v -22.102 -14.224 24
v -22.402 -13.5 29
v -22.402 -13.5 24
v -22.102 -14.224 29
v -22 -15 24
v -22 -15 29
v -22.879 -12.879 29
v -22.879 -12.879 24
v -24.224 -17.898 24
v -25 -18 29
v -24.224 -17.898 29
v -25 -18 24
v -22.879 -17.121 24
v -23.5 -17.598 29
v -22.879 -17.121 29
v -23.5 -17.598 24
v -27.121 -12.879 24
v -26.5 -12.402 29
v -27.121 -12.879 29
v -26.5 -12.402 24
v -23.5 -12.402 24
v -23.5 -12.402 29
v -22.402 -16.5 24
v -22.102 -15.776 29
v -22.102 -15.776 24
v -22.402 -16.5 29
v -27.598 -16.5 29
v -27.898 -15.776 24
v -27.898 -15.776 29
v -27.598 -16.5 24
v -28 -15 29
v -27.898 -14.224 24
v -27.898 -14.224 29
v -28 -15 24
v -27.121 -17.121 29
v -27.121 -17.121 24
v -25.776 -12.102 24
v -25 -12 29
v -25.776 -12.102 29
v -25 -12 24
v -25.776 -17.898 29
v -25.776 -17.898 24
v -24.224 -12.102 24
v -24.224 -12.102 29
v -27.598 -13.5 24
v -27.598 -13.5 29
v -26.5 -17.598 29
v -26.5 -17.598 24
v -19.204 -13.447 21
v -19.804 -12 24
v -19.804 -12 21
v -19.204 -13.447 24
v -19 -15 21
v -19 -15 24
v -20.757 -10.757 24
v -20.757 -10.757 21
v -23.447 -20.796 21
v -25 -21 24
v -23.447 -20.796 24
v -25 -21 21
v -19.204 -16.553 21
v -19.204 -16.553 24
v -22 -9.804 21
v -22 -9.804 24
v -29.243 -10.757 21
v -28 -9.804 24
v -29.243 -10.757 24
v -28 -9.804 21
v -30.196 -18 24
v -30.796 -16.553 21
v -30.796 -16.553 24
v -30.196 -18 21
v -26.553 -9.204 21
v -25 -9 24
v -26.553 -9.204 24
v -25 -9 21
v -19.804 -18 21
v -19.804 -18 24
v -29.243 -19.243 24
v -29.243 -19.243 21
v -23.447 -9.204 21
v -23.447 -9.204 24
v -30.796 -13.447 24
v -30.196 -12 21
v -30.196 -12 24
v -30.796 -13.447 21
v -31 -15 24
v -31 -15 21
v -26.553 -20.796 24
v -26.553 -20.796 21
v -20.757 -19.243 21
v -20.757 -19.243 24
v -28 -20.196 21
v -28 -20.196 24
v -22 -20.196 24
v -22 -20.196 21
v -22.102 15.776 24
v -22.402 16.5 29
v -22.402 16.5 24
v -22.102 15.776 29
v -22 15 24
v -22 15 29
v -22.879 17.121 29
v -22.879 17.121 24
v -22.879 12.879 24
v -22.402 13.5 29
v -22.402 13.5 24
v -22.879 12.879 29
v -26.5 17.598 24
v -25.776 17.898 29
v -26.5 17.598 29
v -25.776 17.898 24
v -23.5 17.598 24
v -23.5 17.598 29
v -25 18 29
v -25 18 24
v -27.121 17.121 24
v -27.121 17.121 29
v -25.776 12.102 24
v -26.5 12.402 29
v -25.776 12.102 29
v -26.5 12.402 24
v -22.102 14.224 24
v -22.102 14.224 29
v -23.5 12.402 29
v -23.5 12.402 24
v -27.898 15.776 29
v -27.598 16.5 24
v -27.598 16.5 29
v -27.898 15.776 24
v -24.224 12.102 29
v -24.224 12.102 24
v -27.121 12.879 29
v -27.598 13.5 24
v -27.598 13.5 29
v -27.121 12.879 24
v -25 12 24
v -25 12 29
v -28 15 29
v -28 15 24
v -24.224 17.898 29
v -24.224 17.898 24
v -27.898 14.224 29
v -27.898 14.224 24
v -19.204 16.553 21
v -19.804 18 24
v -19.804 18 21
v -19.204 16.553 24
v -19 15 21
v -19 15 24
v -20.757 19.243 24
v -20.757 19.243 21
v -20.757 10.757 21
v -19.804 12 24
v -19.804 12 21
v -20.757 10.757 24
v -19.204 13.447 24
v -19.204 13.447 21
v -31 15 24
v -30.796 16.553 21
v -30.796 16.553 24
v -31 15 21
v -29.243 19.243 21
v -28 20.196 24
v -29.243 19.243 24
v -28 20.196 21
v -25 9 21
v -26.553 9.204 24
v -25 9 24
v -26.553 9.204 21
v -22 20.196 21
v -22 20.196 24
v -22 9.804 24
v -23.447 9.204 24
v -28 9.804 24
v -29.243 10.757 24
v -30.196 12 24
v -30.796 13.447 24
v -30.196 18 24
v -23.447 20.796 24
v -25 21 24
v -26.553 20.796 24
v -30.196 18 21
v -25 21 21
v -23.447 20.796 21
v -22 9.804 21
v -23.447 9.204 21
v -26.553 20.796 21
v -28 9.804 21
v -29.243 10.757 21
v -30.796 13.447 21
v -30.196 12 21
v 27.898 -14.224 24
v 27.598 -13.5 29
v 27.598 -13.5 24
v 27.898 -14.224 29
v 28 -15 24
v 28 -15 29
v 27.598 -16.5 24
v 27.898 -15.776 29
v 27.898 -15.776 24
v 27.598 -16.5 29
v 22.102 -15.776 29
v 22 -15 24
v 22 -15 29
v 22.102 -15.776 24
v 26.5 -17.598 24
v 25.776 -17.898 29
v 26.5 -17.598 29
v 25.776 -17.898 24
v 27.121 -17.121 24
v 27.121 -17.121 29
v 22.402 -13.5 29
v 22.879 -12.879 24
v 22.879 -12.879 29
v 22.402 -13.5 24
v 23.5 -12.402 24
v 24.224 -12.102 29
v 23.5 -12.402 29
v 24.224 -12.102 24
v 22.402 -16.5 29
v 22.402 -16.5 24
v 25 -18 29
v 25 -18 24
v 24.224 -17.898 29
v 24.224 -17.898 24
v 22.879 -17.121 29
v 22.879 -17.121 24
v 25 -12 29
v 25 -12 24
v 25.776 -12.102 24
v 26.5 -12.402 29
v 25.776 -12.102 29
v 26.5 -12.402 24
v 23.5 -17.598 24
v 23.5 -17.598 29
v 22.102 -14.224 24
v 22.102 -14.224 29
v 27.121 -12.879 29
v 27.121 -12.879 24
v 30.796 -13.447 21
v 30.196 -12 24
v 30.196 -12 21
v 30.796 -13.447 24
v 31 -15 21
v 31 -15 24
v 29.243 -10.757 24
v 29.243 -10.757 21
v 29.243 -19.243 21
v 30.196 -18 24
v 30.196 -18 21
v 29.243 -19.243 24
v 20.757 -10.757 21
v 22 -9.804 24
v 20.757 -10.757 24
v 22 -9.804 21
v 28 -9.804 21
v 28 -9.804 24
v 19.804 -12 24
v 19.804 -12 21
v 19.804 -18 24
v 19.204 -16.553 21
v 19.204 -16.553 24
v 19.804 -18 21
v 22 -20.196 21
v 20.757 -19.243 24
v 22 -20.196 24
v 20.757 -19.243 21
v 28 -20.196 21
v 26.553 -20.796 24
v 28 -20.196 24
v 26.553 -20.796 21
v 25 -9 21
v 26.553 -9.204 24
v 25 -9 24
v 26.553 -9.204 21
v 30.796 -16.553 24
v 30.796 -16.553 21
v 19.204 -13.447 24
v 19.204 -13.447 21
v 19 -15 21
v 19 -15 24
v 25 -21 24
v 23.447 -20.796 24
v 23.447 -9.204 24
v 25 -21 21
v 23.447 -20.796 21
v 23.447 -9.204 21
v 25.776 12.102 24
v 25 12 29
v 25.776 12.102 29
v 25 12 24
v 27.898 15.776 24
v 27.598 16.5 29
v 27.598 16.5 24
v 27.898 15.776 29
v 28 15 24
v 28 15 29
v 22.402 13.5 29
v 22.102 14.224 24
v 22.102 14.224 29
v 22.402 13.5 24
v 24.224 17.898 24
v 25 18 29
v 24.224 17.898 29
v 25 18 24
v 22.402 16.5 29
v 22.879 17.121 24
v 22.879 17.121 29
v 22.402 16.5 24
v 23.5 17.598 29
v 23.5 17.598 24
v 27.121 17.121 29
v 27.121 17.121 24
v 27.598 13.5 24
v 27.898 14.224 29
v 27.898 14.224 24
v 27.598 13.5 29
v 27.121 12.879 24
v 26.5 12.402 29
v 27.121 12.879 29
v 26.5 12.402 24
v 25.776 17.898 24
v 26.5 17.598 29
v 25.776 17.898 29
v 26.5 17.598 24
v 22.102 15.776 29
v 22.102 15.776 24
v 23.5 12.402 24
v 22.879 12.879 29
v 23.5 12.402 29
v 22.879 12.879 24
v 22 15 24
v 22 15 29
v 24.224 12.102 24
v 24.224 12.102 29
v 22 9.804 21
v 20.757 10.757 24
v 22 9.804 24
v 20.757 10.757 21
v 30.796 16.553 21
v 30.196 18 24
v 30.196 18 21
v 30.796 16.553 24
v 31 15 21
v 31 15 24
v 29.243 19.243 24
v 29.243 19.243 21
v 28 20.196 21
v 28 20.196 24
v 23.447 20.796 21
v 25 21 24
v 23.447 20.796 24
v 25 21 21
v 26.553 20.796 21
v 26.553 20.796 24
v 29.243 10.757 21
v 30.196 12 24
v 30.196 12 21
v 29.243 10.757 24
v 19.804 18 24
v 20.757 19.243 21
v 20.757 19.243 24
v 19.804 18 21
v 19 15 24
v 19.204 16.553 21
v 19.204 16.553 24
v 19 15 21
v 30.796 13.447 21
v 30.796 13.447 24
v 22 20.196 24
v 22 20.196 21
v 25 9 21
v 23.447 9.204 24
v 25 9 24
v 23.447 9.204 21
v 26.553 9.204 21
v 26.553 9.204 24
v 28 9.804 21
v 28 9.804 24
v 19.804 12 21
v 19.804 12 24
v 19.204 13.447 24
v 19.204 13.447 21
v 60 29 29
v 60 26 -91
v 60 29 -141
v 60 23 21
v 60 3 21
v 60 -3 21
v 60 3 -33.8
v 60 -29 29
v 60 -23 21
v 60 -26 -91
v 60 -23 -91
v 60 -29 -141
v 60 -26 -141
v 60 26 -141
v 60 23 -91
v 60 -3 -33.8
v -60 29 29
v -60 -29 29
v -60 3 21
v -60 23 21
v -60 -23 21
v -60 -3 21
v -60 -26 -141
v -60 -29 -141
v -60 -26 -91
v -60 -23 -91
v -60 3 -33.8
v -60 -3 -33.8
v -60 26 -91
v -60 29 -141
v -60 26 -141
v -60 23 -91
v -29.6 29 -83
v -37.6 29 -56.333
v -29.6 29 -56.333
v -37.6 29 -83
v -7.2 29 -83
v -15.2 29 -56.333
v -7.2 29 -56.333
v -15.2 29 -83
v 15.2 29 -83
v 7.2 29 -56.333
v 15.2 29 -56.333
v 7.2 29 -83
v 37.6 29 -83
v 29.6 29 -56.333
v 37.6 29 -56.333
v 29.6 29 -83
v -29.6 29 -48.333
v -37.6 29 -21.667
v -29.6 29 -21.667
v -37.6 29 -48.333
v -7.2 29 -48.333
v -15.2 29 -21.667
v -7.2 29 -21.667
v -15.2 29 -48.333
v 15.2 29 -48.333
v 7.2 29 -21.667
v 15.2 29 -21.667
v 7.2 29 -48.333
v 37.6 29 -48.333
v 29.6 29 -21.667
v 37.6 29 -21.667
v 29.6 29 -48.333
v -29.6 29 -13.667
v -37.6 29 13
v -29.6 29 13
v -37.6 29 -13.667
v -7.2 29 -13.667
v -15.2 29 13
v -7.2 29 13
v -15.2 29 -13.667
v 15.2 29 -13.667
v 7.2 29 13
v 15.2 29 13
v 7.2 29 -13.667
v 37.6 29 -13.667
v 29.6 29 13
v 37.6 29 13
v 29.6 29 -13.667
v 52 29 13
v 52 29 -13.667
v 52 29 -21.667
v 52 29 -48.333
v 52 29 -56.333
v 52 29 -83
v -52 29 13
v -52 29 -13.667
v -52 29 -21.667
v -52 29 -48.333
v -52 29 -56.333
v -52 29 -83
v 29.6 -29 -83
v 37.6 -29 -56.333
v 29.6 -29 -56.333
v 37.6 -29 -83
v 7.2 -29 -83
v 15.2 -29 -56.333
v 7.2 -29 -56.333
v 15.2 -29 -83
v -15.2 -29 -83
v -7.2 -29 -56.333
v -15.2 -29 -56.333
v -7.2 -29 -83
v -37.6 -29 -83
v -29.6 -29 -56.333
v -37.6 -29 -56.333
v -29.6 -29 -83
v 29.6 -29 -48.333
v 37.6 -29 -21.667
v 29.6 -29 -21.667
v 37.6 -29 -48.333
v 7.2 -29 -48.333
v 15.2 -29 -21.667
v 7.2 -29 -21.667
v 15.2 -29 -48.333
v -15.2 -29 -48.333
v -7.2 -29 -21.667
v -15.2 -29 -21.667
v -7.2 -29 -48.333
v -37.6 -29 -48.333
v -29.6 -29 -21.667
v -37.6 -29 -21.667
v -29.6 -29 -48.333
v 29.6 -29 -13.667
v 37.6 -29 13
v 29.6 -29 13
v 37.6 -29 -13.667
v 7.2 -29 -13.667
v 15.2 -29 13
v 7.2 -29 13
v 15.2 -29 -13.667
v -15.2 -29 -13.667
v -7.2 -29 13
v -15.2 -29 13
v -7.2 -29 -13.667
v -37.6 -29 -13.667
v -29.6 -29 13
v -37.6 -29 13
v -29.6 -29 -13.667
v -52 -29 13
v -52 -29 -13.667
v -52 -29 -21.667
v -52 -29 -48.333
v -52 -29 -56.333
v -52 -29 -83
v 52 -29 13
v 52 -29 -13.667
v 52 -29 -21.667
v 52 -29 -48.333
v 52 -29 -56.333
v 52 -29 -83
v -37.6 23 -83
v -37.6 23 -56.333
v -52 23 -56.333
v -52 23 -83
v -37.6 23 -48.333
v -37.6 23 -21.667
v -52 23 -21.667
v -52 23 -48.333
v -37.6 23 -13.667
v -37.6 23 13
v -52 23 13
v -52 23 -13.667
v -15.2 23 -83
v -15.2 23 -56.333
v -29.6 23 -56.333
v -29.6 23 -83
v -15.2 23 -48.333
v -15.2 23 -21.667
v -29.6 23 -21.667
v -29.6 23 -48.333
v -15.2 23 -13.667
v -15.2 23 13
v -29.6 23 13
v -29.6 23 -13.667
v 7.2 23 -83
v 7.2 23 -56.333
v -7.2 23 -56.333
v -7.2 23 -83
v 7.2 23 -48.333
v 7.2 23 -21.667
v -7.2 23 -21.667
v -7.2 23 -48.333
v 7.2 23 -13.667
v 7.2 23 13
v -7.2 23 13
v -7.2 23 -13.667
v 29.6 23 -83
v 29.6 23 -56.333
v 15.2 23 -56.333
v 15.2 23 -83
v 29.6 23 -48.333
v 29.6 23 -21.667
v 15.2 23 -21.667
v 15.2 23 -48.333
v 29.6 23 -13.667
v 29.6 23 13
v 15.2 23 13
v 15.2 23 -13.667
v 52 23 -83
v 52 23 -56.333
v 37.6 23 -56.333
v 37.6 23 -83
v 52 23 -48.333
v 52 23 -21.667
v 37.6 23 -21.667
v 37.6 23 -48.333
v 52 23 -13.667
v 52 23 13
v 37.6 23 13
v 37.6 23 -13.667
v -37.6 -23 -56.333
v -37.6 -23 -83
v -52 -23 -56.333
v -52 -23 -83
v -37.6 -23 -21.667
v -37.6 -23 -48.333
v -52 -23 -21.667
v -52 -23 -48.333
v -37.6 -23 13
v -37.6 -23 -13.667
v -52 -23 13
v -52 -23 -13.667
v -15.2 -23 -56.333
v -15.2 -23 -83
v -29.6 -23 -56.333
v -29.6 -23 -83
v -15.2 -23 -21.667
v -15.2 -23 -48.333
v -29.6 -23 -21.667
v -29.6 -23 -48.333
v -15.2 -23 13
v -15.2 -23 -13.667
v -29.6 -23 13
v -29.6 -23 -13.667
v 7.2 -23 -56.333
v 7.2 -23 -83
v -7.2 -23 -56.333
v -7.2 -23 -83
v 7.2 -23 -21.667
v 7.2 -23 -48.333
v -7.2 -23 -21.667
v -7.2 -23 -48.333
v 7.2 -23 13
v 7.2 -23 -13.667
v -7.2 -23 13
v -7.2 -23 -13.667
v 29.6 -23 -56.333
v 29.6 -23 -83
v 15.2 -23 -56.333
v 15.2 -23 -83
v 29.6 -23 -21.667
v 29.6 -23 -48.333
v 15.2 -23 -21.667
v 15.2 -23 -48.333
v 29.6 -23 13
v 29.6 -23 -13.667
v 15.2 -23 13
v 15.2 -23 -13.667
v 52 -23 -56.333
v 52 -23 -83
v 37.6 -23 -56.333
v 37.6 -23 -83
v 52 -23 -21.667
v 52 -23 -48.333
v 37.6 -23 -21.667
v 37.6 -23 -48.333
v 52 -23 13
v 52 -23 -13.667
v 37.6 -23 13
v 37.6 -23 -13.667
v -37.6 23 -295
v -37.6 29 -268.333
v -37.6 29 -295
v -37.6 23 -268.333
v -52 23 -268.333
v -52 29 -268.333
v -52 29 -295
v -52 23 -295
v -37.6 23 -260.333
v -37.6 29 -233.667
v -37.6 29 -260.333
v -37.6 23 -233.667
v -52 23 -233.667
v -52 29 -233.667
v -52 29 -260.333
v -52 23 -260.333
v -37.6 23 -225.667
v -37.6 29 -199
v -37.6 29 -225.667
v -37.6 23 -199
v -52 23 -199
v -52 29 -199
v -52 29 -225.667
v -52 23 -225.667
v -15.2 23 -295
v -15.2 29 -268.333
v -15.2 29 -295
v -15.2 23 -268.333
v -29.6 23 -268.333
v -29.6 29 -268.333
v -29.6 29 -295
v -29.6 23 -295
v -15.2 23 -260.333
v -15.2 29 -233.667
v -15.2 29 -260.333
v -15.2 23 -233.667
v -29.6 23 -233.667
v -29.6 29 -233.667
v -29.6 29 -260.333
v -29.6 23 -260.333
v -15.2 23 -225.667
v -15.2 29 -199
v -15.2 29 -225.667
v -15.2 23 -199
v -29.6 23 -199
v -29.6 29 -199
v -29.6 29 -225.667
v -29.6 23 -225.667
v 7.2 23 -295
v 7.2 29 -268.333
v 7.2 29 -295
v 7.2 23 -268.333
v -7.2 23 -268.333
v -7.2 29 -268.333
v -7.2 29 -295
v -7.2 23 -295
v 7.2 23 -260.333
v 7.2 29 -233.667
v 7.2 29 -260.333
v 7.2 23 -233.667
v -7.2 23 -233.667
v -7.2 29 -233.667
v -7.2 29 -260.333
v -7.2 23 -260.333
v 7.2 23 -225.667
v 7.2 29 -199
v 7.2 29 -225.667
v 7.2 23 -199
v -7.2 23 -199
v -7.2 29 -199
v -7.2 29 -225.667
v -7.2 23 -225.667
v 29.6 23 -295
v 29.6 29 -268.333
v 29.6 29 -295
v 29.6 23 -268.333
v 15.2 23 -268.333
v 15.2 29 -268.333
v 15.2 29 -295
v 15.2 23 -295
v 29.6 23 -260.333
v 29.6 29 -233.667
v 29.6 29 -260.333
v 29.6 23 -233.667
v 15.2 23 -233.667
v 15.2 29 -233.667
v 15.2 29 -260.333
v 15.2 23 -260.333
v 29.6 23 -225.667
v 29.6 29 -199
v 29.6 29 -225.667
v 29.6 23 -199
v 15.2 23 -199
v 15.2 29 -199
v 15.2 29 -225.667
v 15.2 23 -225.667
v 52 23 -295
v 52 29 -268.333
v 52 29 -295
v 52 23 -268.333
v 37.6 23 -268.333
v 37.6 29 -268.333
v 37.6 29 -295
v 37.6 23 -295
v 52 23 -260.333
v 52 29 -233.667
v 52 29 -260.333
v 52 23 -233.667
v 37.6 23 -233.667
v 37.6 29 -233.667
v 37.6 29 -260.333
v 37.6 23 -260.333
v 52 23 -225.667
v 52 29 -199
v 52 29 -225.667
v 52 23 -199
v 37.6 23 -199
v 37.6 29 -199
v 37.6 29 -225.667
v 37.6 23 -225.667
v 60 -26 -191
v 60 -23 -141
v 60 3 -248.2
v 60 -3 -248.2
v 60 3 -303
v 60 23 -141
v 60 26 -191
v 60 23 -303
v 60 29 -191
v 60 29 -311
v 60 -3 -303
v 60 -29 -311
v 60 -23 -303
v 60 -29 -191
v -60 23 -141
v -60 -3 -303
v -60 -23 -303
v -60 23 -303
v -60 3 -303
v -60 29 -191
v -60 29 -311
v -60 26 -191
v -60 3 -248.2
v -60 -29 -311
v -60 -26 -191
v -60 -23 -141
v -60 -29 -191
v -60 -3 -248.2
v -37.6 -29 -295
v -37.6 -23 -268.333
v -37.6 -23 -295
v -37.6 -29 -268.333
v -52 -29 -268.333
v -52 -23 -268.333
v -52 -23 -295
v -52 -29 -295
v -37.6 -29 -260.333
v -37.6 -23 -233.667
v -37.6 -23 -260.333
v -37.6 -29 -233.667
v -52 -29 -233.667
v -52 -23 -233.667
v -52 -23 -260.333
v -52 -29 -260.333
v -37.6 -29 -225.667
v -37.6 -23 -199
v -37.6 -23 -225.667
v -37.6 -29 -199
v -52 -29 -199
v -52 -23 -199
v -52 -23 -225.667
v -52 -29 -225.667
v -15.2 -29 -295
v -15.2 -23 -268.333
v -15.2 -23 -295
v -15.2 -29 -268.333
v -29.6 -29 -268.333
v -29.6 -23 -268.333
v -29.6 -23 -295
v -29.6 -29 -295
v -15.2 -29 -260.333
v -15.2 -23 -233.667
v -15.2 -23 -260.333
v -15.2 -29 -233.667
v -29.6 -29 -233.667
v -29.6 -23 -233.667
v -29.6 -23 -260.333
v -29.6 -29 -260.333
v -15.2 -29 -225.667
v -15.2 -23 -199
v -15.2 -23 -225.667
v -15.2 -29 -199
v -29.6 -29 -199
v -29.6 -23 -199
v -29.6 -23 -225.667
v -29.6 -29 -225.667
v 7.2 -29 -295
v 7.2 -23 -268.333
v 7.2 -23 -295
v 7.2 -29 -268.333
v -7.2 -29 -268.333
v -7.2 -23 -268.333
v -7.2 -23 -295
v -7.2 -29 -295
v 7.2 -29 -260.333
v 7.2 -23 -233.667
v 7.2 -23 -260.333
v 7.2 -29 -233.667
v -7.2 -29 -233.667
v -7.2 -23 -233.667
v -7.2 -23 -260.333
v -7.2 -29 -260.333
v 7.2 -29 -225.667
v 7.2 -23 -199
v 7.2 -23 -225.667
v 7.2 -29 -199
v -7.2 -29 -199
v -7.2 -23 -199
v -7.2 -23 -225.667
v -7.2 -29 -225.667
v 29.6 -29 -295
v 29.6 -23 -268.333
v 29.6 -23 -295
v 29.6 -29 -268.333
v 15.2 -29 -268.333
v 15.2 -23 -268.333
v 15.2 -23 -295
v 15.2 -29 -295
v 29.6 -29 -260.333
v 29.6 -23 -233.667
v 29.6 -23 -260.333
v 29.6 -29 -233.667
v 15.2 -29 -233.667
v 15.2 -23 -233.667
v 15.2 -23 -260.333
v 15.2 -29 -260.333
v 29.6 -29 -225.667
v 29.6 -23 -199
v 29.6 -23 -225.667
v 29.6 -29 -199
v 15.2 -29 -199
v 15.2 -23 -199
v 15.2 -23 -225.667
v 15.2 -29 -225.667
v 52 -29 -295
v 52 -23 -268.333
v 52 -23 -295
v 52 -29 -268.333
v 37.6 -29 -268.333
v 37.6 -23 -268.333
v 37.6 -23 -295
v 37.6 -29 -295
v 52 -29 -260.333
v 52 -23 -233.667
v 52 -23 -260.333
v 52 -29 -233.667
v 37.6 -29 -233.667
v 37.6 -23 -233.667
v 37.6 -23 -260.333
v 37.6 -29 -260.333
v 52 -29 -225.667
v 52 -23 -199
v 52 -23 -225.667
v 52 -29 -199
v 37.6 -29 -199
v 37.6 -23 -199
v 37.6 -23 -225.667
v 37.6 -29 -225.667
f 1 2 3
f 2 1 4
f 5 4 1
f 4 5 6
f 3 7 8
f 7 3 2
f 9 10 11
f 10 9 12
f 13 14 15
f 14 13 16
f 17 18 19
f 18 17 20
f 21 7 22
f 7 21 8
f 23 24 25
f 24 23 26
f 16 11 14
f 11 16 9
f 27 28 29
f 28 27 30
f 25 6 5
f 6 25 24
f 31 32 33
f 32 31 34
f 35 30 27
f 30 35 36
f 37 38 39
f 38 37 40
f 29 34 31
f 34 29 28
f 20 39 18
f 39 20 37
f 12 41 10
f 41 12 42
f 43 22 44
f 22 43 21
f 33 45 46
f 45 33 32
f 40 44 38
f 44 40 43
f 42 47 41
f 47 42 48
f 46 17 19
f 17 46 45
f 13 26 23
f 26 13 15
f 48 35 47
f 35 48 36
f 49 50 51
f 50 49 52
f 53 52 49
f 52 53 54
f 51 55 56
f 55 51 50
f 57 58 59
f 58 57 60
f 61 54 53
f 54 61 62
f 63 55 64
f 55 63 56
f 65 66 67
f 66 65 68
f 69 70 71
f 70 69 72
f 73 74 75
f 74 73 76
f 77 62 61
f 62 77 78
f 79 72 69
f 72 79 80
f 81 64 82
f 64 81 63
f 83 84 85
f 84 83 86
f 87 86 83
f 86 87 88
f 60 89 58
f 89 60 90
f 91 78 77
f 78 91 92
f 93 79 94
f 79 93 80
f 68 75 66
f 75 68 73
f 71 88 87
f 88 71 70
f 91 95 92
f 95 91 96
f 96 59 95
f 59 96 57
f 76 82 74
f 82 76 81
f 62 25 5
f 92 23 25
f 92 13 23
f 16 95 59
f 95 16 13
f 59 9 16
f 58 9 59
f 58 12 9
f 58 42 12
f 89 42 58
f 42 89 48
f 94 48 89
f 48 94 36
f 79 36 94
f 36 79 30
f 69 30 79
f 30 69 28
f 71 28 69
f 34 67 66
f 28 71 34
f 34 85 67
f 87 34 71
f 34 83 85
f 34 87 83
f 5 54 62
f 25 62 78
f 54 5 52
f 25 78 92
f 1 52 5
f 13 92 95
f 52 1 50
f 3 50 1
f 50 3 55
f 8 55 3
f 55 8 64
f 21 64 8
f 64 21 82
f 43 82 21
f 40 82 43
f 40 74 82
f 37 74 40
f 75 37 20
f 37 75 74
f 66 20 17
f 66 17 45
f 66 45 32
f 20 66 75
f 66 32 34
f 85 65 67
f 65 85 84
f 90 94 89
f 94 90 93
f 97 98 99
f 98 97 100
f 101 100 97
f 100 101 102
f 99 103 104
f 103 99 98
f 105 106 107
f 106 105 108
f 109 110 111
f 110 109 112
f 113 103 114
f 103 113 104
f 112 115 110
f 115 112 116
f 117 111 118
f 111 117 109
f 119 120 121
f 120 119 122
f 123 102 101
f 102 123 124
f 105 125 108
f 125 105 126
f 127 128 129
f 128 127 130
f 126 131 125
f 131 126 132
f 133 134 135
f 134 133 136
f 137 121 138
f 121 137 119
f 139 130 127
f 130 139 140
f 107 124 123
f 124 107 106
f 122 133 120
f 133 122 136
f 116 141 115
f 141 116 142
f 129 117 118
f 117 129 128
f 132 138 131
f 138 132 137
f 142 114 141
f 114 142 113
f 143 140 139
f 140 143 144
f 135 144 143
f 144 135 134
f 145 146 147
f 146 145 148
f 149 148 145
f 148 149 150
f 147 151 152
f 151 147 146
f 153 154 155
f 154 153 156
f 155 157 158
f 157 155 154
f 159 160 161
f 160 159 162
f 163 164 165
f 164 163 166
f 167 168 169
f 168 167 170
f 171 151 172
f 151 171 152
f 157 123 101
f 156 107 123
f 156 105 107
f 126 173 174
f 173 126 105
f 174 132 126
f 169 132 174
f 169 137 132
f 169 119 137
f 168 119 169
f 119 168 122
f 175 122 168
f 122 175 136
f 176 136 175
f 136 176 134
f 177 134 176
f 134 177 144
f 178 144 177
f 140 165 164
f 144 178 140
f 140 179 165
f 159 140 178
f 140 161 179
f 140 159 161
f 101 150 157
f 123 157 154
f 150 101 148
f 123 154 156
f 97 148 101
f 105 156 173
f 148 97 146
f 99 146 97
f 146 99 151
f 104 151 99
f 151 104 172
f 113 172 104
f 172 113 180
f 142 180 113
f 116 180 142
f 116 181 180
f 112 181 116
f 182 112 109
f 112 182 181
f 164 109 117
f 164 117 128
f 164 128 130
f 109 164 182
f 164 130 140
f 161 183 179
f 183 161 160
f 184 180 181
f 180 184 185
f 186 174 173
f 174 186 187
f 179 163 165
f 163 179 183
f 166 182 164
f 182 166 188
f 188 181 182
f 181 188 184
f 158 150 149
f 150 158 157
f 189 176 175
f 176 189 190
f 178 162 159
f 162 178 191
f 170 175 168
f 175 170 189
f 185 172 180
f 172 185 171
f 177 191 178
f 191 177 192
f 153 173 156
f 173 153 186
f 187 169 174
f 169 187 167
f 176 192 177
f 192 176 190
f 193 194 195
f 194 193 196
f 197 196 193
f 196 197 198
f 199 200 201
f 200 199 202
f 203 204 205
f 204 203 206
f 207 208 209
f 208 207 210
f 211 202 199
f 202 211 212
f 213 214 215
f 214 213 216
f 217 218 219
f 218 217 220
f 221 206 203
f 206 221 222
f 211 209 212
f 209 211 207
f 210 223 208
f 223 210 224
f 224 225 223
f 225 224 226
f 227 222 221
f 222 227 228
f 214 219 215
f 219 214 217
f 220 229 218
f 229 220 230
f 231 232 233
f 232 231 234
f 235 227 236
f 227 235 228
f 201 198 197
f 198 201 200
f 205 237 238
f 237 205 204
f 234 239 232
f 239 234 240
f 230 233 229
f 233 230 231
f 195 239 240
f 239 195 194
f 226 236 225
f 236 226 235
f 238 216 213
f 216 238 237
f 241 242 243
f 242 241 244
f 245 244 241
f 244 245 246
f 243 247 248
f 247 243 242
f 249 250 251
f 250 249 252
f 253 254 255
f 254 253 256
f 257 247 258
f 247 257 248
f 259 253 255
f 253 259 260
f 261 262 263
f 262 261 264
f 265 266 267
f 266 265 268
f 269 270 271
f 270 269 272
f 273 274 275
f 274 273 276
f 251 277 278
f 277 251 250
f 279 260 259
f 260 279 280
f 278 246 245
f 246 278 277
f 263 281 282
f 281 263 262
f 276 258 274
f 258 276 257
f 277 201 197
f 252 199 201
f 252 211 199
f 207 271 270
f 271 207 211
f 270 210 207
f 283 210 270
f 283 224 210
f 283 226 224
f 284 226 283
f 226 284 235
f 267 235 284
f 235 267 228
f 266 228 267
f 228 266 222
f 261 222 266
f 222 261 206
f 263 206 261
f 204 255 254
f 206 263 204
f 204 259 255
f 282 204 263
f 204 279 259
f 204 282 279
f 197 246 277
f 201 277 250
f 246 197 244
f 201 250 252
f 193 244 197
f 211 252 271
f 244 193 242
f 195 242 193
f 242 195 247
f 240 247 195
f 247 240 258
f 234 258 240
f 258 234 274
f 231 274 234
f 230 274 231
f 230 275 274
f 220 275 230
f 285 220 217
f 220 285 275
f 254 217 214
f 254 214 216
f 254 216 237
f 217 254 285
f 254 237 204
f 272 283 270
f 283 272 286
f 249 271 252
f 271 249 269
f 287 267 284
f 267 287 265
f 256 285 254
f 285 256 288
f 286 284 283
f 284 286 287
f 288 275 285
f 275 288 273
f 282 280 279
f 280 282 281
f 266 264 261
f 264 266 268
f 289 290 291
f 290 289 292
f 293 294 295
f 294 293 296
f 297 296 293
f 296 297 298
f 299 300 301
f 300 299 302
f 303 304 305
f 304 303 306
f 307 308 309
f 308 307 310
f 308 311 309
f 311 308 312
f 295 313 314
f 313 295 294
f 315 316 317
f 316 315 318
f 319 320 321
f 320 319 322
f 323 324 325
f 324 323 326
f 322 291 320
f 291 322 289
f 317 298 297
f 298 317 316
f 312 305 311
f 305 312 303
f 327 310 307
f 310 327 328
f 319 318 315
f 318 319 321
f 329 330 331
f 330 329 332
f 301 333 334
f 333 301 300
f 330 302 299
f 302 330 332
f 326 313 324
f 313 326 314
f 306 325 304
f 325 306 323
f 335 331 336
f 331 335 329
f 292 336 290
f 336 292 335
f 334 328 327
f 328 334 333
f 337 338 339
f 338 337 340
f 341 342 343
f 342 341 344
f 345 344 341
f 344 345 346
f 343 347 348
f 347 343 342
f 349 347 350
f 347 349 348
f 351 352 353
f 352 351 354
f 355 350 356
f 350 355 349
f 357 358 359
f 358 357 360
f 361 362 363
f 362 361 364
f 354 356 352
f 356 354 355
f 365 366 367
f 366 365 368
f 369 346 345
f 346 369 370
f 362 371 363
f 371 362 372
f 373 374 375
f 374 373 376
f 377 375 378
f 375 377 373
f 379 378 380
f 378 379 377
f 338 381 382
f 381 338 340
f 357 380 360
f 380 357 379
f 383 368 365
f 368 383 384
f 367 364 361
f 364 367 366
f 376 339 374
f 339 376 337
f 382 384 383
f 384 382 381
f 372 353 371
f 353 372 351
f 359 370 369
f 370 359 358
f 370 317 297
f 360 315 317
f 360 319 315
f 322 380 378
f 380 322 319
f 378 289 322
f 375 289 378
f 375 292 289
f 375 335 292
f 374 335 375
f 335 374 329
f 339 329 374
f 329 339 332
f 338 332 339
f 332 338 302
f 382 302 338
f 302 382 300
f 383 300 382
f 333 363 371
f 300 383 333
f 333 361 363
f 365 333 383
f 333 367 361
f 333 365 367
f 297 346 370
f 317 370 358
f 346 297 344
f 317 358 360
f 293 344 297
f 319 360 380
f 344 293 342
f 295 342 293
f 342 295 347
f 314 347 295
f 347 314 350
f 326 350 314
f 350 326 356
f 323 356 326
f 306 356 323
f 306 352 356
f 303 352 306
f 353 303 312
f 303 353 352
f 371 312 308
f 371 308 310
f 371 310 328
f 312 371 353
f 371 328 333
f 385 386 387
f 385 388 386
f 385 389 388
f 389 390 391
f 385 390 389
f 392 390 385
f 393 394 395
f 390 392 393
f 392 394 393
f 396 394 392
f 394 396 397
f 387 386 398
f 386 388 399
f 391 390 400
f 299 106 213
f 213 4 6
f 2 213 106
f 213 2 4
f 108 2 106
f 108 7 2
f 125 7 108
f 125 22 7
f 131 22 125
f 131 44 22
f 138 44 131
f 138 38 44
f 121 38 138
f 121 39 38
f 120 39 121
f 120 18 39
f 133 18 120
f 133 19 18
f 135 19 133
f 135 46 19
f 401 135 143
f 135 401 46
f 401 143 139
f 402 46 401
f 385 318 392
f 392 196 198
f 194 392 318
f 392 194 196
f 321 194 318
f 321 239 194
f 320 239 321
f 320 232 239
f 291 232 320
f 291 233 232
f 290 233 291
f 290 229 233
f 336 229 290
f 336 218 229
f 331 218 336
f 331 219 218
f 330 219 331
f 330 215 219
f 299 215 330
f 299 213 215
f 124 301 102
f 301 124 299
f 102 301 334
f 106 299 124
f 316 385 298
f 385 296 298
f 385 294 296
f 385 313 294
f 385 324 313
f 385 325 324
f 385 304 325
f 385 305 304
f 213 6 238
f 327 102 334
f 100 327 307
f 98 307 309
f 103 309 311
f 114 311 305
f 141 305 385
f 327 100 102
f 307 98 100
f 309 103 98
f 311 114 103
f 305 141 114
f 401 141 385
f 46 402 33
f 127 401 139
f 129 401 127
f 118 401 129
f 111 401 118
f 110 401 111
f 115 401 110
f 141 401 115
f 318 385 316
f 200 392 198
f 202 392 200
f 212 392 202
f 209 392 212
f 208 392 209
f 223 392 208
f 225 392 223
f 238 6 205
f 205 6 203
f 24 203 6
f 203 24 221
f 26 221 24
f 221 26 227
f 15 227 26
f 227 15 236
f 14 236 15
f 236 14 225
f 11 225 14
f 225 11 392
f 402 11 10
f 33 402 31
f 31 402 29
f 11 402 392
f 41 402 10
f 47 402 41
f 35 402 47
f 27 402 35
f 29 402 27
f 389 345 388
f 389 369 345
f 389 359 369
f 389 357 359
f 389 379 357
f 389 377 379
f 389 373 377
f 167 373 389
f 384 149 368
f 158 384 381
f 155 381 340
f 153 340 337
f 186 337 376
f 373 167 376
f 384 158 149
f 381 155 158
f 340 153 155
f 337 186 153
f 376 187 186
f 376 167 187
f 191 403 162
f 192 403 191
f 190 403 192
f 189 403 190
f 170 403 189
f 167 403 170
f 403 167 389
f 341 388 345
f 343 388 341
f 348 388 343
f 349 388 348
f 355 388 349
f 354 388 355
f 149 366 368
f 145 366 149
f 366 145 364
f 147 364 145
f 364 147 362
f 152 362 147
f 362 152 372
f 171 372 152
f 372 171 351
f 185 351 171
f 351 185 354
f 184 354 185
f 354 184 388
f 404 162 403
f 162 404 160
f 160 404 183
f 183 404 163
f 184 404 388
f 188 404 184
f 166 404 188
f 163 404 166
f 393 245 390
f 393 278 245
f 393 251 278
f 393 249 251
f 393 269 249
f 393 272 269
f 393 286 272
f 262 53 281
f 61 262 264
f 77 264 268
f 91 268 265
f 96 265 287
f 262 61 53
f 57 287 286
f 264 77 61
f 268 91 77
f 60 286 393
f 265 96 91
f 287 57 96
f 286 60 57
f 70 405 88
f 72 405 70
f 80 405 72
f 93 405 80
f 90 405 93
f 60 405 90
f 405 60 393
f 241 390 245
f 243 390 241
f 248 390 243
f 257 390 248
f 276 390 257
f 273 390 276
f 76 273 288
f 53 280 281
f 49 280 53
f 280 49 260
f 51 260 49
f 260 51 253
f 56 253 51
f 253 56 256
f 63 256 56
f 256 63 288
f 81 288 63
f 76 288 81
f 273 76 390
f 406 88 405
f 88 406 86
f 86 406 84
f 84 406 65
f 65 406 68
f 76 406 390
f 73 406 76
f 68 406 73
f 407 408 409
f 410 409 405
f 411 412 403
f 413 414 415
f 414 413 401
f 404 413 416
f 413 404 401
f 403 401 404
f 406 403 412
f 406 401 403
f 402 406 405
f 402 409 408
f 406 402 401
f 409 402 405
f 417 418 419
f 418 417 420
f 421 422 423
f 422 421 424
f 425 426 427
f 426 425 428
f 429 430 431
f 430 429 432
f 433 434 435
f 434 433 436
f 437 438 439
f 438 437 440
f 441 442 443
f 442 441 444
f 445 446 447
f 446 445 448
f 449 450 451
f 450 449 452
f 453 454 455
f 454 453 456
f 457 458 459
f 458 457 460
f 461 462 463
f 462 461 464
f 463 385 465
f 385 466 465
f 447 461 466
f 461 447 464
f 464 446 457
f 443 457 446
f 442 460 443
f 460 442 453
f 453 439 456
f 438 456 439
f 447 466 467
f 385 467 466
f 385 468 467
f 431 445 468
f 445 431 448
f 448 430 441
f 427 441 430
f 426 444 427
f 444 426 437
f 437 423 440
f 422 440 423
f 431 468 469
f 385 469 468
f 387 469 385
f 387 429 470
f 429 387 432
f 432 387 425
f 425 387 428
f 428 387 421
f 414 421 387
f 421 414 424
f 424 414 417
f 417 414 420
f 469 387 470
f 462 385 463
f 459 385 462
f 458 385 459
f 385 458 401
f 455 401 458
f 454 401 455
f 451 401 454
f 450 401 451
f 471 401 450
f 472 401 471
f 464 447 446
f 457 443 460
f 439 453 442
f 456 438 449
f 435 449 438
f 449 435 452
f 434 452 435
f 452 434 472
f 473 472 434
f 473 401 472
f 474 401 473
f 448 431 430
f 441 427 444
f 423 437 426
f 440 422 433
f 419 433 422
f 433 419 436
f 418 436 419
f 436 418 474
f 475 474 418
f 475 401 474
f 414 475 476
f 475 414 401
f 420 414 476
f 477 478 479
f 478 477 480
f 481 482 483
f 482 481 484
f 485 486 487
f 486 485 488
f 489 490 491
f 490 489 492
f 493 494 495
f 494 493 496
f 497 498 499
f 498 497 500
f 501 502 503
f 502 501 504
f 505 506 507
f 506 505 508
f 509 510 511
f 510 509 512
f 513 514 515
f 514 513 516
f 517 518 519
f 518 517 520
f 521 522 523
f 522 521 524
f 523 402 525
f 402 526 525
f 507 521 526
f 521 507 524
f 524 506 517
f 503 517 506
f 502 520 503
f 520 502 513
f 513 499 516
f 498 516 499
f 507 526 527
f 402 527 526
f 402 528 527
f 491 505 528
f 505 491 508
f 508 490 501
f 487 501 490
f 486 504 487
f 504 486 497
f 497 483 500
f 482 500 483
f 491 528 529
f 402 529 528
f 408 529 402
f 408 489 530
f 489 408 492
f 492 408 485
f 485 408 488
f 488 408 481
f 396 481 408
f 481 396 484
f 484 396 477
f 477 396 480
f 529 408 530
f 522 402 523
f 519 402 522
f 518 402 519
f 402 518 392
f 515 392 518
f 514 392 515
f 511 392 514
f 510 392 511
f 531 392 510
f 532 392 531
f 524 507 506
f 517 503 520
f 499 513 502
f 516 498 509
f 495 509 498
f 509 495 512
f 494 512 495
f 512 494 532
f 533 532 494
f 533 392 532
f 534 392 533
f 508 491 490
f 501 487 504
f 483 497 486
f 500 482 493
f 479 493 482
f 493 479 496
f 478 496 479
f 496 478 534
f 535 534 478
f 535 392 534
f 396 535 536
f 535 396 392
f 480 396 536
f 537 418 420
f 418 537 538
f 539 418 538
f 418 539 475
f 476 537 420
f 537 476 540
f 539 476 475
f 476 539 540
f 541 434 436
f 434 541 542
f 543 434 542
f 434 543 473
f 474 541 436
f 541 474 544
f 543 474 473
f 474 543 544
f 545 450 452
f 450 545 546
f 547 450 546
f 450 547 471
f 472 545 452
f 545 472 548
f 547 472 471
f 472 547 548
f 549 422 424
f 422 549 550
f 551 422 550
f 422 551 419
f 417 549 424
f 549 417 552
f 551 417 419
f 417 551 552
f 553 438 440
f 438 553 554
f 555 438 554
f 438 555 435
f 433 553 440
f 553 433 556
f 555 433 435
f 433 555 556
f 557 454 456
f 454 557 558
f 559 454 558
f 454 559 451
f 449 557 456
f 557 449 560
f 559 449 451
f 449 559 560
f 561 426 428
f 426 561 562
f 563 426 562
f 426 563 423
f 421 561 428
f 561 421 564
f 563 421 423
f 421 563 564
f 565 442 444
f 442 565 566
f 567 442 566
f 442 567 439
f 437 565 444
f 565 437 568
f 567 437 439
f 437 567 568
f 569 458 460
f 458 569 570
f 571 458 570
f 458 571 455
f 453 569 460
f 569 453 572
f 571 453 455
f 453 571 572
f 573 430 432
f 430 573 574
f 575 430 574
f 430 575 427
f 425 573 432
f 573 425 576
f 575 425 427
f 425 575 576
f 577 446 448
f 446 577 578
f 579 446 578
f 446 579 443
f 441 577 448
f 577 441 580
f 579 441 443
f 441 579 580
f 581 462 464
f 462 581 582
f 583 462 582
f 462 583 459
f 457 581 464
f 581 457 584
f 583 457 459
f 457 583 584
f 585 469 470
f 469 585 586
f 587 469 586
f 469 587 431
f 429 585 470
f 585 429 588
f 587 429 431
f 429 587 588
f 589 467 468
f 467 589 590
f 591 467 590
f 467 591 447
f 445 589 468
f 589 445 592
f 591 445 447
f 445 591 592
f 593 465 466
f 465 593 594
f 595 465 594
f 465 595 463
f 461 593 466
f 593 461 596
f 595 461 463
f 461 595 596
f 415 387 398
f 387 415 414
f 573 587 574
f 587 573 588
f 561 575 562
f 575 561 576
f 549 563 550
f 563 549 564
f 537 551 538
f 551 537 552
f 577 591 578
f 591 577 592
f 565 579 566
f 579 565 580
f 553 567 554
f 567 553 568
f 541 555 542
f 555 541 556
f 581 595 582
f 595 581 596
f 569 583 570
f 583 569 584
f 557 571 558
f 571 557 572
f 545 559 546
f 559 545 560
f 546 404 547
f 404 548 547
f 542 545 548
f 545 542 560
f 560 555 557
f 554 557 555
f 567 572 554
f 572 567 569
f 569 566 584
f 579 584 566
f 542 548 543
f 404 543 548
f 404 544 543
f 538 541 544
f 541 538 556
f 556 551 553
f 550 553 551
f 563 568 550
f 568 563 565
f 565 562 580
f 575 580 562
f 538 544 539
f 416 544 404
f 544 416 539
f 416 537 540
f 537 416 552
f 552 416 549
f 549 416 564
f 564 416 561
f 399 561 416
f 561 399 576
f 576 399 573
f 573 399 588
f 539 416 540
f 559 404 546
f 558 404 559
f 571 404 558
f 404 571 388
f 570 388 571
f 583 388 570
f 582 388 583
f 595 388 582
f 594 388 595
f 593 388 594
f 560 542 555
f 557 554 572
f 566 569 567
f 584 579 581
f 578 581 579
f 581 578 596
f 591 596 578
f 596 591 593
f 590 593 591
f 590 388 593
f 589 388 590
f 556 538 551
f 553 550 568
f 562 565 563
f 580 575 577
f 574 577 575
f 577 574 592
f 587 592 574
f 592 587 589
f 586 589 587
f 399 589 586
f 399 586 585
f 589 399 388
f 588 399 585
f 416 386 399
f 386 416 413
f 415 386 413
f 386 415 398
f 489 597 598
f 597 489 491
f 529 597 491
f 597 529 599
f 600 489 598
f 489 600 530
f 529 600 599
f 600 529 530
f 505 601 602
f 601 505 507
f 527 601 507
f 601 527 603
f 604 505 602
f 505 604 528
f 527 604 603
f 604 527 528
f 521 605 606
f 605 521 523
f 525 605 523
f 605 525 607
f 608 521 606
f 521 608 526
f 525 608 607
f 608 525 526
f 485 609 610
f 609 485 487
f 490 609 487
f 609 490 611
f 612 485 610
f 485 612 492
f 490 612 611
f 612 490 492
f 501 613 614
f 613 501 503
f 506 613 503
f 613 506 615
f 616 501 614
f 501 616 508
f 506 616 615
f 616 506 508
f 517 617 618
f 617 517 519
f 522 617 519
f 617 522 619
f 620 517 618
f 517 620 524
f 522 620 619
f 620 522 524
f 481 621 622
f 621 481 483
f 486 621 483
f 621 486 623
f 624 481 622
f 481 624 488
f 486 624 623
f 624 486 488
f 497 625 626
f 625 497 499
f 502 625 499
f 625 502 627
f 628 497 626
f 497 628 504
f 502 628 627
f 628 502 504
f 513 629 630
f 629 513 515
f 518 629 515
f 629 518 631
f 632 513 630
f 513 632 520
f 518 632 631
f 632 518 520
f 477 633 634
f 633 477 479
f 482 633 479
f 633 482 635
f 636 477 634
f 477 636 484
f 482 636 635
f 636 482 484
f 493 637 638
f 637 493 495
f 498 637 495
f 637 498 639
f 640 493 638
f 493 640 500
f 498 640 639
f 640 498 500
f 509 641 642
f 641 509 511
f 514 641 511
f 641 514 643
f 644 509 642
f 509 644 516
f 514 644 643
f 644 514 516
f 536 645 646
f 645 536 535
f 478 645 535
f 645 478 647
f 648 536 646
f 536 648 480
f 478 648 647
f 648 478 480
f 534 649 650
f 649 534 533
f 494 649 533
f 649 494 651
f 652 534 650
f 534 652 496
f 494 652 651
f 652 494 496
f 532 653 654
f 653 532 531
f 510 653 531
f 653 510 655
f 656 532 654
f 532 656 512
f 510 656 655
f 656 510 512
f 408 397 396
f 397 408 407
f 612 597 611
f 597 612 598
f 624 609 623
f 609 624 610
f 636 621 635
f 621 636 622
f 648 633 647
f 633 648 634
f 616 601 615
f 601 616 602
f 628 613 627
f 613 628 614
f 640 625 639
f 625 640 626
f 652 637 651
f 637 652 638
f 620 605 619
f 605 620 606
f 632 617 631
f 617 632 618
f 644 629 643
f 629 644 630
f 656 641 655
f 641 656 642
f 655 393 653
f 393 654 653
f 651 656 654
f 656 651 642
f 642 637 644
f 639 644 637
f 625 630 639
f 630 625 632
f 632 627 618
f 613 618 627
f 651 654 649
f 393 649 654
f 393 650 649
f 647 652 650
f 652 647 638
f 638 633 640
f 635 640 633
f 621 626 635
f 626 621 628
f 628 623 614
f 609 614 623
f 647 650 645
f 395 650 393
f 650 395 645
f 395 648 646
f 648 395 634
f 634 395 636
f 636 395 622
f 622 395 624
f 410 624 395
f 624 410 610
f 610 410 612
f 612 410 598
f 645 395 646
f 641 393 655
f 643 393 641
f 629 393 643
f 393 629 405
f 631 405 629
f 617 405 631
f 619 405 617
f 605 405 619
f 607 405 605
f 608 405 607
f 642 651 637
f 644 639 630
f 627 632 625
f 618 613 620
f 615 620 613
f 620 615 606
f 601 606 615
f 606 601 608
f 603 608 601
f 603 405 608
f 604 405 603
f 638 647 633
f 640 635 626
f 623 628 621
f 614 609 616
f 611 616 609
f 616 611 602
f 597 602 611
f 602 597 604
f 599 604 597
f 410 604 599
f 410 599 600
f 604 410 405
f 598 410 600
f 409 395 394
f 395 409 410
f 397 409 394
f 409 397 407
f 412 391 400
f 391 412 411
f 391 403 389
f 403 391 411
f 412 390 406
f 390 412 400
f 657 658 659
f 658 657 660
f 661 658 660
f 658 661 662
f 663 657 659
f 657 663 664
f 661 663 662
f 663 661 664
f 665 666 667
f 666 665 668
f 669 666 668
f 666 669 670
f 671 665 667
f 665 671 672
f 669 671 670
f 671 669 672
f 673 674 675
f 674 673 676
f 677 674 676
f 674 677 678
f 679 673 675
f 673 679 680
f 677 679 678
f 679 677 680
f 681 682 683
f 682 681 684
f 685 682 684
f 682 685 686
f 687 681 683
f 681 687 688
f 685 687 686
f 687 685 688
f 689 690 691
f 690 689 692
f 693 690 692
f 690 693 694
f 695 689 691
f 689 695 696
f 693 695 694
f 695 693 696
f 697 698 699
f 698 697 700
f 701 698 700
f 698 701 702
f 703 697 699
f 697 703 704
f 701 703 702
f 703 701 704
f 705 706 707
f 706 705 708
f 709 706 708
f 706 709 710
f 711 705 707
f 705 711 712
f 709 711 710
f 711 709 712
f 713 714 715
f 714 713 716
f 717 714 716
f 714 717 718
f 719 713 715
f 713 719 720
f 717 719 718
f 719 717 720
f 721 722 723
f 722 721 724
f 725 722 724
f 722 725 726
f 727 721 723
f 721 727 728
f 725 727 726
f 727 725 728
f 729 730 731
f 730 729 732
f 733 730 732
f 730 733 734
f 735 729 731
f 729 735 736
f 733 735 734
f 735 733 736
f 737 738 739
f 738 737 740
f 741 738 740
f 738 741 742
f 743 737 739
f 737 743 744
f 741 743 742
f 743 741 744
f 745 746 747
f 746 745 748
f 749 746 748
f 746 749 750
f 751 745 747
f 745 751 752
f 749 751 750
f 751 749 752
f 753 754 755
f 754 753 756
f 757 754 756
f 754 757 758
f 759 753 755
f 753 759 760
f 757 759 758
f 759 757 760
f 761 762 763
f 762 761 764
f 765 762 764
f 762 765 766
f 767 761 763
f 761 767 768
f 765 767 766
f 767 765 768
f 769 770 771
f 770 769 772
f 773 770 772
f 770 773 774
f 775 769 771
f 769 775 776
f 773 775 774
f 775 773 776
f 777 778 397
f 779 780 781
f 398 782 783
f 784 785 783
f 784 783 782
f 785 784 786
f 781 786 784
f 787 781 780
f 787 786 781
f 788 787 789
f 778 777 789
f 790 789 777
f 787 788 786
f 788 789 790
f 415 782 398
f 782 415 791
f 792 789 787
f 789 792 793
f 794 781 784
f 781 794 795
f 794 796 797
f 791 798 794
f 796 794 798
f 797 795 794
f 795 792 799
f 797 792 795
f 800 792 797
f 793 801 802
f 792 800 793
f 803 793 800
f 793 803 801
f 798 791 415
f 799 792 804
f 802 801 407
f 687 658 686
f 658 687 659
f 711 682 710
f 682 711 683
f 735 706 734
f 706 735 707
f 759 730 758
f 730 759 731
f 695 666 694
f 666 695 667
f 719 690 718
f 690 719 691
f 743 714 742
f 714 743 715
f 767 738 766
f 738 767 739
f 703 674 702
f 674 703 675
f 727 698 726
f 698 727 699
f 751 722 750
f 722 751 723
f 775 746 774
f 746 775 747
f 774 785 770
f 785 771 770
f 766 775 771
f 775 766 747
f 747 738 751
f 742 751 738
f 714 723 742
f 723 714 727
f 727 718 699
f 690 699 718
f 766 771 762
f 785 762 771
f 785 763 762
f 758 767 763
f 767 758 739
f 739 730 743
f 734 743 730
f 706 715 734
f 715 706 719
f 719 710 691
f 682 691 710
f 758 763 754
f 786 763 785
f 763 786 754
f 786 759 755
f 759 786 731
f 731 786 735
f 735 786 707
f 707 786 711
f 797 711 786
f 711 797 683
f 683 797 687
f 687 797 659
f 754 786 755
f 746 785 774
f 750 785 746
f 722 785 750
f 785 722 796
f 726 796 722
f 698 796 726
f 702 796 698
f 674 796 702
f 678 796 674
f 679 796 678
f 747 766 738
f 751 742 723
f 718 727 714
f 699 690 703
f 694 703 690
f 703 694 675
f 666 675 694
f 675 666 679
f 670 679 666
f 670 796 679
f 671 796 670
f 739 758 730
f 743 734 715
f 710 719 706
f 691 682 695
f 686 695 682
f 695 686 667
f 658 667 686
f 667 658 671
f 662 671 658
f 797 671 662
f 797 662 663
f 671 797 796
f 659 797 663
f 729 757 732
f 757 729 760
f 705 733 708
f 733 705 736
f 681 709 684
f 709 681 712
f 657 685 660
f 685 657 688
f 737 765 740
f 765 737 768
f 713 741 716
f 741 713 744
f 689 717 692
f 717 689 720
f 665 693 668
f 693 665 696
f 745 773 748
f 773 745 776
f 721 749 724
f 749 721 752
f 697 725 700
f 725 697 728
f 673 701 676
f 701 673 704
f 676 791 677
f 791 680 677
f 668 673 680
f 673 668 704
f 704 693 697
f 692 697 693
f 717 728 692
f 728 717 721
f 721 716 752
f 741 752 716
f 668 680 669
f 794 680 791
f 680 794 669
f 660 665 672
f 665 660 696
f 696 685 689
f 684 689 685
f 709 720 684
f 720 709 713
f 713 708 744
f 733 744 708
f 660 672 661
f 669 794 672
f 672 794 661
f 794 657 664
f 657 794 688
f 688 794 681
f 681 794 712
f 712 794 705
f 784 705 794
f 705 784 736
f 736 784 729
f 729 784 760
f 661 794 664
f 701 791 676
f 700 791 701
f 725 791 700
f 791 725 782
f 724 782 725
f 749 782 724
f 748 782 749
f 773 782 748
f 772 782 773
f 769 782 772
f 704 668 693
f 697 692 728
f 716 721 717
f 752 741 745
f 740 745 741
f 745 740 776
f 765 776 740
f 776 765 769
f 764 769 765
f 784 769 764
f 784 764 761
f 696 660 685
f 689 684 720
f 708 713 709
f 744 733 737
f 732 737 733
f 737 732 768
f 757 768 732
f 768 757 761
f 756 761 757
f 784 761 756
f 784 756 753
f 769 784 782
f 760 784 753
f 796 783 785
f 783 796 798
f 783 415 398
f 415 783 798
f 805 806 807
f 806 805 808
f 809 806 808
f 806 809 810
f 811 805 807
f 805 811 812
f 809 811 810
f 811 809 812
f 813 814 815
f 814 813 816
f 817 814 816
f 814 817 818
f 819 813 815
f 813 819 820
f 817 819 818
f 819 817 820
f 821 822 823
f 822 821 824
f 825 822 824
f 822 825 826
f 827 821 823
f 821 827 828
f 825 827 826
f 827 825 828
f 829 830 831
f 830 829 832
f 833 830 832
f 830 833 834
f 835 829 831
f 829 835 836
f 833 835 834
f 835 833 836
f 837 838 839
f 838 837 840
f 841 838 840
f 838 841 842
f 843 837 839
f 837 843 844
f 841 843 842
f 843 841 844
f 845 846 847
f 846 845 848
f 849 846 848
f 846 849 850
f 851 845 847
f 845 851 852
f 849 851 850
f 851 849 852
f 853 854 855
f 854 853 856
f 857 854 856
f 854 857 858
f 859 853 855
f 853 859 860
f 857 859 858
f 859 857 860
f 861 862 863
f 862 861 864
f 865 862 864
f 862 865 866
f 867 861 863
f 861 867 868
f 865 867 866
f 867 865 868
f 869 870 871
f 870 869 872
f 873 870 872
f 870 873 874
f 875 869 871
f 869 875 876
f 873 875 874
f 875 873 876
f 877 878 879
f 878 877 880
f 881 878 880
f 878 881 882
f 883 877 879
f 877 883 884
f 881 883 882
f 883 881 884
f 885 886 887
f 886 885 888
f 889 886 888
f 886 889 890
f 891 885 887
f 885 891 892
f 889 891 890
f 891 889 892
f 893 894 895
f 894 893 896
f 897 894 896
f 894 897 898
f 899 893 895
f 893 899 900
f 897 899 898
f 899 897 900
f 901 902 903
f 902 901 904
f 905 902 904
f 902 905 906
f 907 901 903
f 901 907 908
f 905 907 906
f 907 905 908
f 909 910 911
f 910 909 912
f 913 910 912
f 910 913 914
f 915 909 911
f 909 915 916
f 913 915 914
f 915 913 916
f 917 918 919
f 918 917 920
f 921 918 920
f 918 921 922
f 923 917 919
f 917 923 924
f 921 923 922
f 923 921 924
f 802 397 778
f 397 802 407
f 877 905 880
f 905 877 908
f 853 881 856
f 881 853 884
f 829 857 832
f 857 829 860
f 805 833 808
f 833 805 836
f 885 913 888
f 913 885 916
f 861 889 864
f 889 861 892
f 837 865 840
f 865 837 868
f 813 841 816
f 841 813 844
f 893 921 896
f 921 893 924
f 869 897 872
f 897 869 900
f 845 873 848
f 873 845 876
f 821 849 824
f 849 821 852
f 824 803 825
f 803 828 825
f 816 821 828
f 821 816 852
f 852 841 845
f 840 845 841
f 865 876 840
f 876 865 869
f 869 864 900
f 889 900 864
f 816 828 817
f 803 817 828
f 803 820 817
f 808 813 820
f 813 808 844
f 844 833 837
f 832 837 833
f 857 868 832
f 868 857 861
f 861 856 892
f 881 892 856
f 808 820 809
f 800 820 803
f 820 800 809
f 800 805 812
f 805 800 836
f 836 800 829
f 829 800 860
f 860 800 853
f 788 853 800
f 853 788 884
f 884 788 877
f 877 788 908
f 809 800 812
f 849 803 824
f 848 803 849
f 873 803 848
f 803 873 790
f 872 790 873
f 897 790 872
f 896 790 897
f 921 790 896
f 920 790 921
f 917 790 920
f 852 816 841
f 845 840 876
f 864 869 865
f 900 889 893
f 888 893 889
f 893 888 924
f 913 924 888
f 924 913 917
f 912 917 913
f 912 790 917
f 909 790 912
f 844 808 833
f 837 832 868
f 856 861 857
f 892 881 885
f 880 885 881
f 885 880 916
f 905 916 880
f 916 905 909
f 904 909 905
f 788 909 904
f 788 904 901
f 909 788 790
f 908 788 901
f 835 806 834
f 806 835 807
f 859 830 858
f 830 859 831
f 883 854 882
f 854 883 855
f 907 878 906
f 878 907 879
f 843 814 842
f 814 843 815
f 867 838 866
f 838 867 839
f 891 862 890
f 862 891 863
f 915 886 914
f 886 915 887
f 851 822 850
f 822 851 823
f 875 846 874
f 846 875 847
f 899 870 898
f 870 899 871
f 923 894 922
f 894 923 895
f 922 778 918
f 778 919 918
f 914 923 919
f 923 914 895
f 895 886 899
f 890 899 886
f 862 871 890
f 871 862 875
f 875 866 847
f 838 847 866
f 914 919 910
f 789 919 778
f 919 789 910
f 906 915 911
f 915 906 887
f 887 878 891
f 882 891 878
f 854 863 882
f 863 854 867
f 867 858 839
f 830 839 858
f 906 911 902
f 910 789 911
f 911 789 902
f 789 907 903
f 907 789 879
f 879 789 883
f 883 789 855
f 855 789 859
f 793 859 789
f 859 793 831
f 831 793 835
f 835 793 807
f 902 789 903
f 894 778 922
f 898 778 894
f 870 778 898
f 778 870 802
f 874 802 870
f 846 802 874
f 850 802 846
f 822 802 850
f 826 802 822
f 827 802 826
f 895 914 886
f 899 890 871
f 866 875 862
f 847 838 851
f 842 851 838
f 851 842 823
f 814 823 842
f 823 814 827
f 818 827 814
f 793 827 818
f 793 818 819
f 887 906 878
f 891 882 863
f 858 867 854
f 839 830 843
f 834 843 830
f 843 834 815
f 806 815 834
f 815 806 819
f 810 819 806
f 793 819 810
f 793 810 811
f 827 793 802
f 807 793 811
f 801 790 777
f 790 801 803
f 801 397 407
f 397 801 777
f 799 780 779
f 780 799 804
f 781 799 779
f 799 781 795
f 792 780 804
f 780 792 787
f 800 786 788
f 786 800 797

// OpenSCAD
// ===== PARAMETERS =====
// Hole pattern dimensions (distance between corner holes)
hole_pattern_length = 50;  // X distance between holes
hole_pattern_width = 30;   // Y distance between holes
hole_diameter = 6;         // Hole diameter at corners
nut_recess_diameter = 12;  // Diameter for nut head recess
screw_material = 5;        // Material thickness for screw threads
plate_margin = 5;          // Margin/padding around hole pattern
plate_thickness = 8;       // Thickness of plate
wall_t = 6;                // Wall thickness
length_multiplier = 2;     // Multiplier for plate length (X direction)

// Internal compartment dimensions
compartment_gap = 40;      // Gap between side walls (Y) - space for items
internal_width = compartment_gap + wall_t;   // Total internal width including middle divider
internal_height = 274;     // Internal height (Z) - 10 inches + 20mm = 274mm (vertical)

// Middle wall configuration
middle_wall_depth_pct = 0.20;  // How far the middle wall extends (20% from each end)
middle_wall_depth = internal_height * middle_wall_depth_pct;

// Wall cutout pattern (for material savings)
cutout_columns = 5;       // Number of cutouts along wall length
cutout_rows = 3;          // Number of cutouts up wall height (per wall half)
cutout_margin = 0;        // Extra margin beyond rib (0 = rib width is the edge margin)
cutout_rib = 8;           // Width of ribs between cutouts (also used as edge margin)

// Lap joint configuration
lap_overlap = 50;          // How much the lap joint overlaps (configurable)
lap_thickness = wall_t / 2; // Half the wall thickness for the lap

// View options
part = "exploded"; // [top:Top Half, bottom:Bottom Half, exploded:Exploded View, assembled:Assembled]
explode_distance = 50;     // Gap between pieces in exploded view

// Derived dimensions
plate_length = (hole_pattern_length + 2*plate_margin) * length_multiplier;
plate_width = internal_width + 2*wall_t;  // Width based on internal space + side walls
half_height = internal_height / 2;  // Center point where joint occurs

// ===== HELPERS =====
function hole_offset_x() = hole_pattern_length / 2;
function hole_offset_y() = hole_pattern_width / 2;
function wall_y_pos() = internal_width / 2 + wall_t / 2;

// Cutout dimension calculations
// Given available space, grid count, and rib width, calculate cutout size
function cutout_width(avail_length, cols, rib) =
    (avail_length - (cols + 1) * rib) / cols;
function cutout_height(avail_height, rows, rib) =
    (avail_height - (rows + 1) * rib) / rows;

// ===== MODULES =====

// Generates a grid of rectangular cutouts for wall material savings
// wall_length: total wall length (X)
// wall_height: height of the cuttable area (Z) - excludes lap zone
// wall_thickness: wall thickness (Y) - cutouts go through
// cols/rows: number of cutouts in each direction
// margin: solid border around the pattern
// rib: width of material between cutouts
module wall_cutout_grid(
    wall_length,
    wall_height,
    wall_thickness,
    cols = cutout_columns,
    rows = cutout_rows,
    margin = cutout_margin,
    rib = cutout_rib
) {
    // Available space after margins
    avail_length = wall_length - 2 * margin;
    avail_height = wall_height - 2 * margin;

    // Calculate cutout dimensions
    cut_w = cutout_width(avail_length, cols, rib);
    cut_h = cutout_height(avail_height, rows, rib);

    // Only render if cutouts have positive size
    if (cut_w > 0 && cut_h > 0) {
        // Grid centered on wall center
        for (col = [0 : cols - 1]) {
            for (row = [0 : rows - 1]) {
                // Position: start from corner, offset by margin + rib, then by cell position
                x_pos = -wall_length/2 + margin + rib + cut_w/2 + col * (cut_w + rib);
                z_pos = -wall_height/2 + margin + rib + cut_h/2 + row * (cut_h + rib);

                translate([x_pos, 0, z_pos])
                    cube([cut_w, wall_thickness + 2, cut_h], center=true);
            }
        }
    }
}

// Top plate with corner holes and nut recesses
module top_plate(
    length = plate_length,
    width = plate_width,
    thickness = plate_thickness,
    hole_d = hole_diameter,
    nut_d = nut_recess_diameter,
    screw_mat = screw_material
) {
    recess_depth = thickness - screw_mat;  // Depth of nut recess

    difference() {
        cube([length, width, thickness], center=true);

        off_x = hole_offset_x();
        off_y = hole_offset_y();

        for (dx = [-1, 1]) {
            for (dy = [-1, 1]) {
                // Through hole for screw
                translate([dx * off_x, dy * off_y, -thickness/2 - 1])
                    cylinder(h = thickness + 2, d = hole_d, center=false, $fn=24);

                // Nut recess from bottom (nuts go up)
                translate([dx * off_x, dy * off_y, -thickness/2 - 1])
                    cylinder(h = recess_depth + 1, d = nut_d, center=false, $fn=24);
            }
        }
    }
}

// Bottom plate (same as top but without holes)
module bottom_plate(
    length = plate_length,
    width = plate_width,
    thickness = plate_thickness
) {
    cube([length, width, thickness], center=true);
}

// Single wall with lap joint cut and optional cutout pattern
// side: 1 = outer lap (for top piece), -1 = inner lap (for bottom piece)
module wall_with_lap(
    length = plate_length,
    height,
    thickness = wall_t,
    lap_h = lap_overlap,
    lap_t = lap_thickness,
    side = 1,  // 1 = cut inner half (top piece), -1 = cut outer half (bottom piece)
    add_cutouts = true
) {
    // Height available for cutouts: total height minus lap zone minus margin from lap edge
    cutout_zone_height = height - lap_h - cutout_margin;

    // Z offset for cutout zone center (opposite side from lap)
    // side=1 (top piece): lap at bottom, cutouts toward top (positive Z)
    // side=-1 (bottom piece): lap at top, cutouts toward bottom (negative Z)
    cutout_zone_z = side * (lap_h / 2 + cutout_margin / 2);

    difference() {
        // Full wall
        cube([length, thickness, height], center=true);

        // Cut away half the thickness at the lap zone
        // side=1: remove inner half (Y negative side of wall center)
        // side=-1: remove outer half (Y positive side of wall center)
        translate([0, -side * lap_t / 2, (height / 2 - lap_h / 2) * -sign(side)])
            cube([length + 1, lap_t, lap_h], center=true);

        // Cutout pattern (only in the non-lap zone)
        if (add_cutouts && cutout_zone_height > 2 * cutout_margin) {
            translate([0, 0, cutout_zone_z])
                wall_cutout_grid(
                    wall_length = length,
                    wall_height = cutout_zone_height,
                    wall_thickness = thickness
                );
        }
    }
}

// Helper to get sign
function sign(x) = x > 0 ? 1 : (x < 0 ? -1 : 0);

// Middle divider wall (partial height)
module middle_wall(
    length = plate_length,
    height = middle_wall_depth,
    thickness = wall_t
) {
    cube([length, thickness, height], center=true);
}

// TOP HALF: top plate + upper walls with lap joint extending down + middle wall
module top_half() {
    // Top plate
    top_plate();

    // Upper portion of walls (from top plate down to center + half overlap)
    // Each wall extends by lap_overlap/2 so together they overlap by lap_overlap
    upper_wall_height = half_height + lap_overlap / 2;
    y_pos = wall_y_pos();
    z_start = -plate_thickness / 2;

    // Left wall (positive Y) - lap material on outer side (+Y)
    translate([0, y_pos, z_start - upper_wall_height / 2])
        wall_with_lap(height = upper_wall_height, side = 1);

    // Right wall (negative Y) - lap material on outer side (-Y) - MIRRORED
    translate([0, -y_pos, z_start - upper_wall_height / 2])
        mirror([0, 1, 0]) wall_with_lap(height = upper_wall_height, side = 1);

    // Middle wall extending down 20%
    translate([0, 0, z_start - middle_wall_depth / 2])
        middle_wall();
}

// BOTTOM HALF: bottom plate + lower walls with lap joint extending up + middle wall
module bottom_half() {
    // Lower portion of walls (from bottom plate up to center + half overlap)
    // Each wall extends by lap_overlap/2 so together they overlap by lap_overlap
    lower_wall_height = half_height + lap_overlap / 2;
    y_pos = wall_y_pos();
    z_end = -plate_thickness / 2 - internal_height;

    // Left wall (positive Y) - lap material on inner side (-Y)
    translate([0, y_pos, z_end + lower_wall_height / 2])
        wall_with_lap(height = lower_wall_height, side = -1);

    // Right wall (negative Y) - lap material on inner side (+Y) - MIRRORED
    translate([0, -y_pos, z_end + lower_wall_height / 2])
        mirror([0, 1, 0]) wall_with_lap(height = lower_wall_height, side = -1);

    // Middle wall extending up 20%
    translate([0, 0, z_end + middle_wall_depth / 2])
        middle_wall();

    // Bottom plate
    translate([0, 0, z_end - plate_thickness / 2])
        bottom_plate();
}

// ===== RENDER =====
if (part == "top") {
    // Top half only - rotated flat for printing
    rotate([180, 0, 0])
        top_half();
} else if (part == "bottom") {
    // Bottom half only - already flat for printing
    translate([0, 0, plate_thickness / 2 + internal_height + plate_thickness / 2])
        bottom_half();
} else if (part == "exploded") {
    // Exploded/disassembled view
    translate([0, 0, explode_distance / 2])
        top_half();
    translate([0, 0, -explode_distance / 2])
        bottom_half();
} else {
    // Assembled view
    top_half();
    bottom_half();
}
